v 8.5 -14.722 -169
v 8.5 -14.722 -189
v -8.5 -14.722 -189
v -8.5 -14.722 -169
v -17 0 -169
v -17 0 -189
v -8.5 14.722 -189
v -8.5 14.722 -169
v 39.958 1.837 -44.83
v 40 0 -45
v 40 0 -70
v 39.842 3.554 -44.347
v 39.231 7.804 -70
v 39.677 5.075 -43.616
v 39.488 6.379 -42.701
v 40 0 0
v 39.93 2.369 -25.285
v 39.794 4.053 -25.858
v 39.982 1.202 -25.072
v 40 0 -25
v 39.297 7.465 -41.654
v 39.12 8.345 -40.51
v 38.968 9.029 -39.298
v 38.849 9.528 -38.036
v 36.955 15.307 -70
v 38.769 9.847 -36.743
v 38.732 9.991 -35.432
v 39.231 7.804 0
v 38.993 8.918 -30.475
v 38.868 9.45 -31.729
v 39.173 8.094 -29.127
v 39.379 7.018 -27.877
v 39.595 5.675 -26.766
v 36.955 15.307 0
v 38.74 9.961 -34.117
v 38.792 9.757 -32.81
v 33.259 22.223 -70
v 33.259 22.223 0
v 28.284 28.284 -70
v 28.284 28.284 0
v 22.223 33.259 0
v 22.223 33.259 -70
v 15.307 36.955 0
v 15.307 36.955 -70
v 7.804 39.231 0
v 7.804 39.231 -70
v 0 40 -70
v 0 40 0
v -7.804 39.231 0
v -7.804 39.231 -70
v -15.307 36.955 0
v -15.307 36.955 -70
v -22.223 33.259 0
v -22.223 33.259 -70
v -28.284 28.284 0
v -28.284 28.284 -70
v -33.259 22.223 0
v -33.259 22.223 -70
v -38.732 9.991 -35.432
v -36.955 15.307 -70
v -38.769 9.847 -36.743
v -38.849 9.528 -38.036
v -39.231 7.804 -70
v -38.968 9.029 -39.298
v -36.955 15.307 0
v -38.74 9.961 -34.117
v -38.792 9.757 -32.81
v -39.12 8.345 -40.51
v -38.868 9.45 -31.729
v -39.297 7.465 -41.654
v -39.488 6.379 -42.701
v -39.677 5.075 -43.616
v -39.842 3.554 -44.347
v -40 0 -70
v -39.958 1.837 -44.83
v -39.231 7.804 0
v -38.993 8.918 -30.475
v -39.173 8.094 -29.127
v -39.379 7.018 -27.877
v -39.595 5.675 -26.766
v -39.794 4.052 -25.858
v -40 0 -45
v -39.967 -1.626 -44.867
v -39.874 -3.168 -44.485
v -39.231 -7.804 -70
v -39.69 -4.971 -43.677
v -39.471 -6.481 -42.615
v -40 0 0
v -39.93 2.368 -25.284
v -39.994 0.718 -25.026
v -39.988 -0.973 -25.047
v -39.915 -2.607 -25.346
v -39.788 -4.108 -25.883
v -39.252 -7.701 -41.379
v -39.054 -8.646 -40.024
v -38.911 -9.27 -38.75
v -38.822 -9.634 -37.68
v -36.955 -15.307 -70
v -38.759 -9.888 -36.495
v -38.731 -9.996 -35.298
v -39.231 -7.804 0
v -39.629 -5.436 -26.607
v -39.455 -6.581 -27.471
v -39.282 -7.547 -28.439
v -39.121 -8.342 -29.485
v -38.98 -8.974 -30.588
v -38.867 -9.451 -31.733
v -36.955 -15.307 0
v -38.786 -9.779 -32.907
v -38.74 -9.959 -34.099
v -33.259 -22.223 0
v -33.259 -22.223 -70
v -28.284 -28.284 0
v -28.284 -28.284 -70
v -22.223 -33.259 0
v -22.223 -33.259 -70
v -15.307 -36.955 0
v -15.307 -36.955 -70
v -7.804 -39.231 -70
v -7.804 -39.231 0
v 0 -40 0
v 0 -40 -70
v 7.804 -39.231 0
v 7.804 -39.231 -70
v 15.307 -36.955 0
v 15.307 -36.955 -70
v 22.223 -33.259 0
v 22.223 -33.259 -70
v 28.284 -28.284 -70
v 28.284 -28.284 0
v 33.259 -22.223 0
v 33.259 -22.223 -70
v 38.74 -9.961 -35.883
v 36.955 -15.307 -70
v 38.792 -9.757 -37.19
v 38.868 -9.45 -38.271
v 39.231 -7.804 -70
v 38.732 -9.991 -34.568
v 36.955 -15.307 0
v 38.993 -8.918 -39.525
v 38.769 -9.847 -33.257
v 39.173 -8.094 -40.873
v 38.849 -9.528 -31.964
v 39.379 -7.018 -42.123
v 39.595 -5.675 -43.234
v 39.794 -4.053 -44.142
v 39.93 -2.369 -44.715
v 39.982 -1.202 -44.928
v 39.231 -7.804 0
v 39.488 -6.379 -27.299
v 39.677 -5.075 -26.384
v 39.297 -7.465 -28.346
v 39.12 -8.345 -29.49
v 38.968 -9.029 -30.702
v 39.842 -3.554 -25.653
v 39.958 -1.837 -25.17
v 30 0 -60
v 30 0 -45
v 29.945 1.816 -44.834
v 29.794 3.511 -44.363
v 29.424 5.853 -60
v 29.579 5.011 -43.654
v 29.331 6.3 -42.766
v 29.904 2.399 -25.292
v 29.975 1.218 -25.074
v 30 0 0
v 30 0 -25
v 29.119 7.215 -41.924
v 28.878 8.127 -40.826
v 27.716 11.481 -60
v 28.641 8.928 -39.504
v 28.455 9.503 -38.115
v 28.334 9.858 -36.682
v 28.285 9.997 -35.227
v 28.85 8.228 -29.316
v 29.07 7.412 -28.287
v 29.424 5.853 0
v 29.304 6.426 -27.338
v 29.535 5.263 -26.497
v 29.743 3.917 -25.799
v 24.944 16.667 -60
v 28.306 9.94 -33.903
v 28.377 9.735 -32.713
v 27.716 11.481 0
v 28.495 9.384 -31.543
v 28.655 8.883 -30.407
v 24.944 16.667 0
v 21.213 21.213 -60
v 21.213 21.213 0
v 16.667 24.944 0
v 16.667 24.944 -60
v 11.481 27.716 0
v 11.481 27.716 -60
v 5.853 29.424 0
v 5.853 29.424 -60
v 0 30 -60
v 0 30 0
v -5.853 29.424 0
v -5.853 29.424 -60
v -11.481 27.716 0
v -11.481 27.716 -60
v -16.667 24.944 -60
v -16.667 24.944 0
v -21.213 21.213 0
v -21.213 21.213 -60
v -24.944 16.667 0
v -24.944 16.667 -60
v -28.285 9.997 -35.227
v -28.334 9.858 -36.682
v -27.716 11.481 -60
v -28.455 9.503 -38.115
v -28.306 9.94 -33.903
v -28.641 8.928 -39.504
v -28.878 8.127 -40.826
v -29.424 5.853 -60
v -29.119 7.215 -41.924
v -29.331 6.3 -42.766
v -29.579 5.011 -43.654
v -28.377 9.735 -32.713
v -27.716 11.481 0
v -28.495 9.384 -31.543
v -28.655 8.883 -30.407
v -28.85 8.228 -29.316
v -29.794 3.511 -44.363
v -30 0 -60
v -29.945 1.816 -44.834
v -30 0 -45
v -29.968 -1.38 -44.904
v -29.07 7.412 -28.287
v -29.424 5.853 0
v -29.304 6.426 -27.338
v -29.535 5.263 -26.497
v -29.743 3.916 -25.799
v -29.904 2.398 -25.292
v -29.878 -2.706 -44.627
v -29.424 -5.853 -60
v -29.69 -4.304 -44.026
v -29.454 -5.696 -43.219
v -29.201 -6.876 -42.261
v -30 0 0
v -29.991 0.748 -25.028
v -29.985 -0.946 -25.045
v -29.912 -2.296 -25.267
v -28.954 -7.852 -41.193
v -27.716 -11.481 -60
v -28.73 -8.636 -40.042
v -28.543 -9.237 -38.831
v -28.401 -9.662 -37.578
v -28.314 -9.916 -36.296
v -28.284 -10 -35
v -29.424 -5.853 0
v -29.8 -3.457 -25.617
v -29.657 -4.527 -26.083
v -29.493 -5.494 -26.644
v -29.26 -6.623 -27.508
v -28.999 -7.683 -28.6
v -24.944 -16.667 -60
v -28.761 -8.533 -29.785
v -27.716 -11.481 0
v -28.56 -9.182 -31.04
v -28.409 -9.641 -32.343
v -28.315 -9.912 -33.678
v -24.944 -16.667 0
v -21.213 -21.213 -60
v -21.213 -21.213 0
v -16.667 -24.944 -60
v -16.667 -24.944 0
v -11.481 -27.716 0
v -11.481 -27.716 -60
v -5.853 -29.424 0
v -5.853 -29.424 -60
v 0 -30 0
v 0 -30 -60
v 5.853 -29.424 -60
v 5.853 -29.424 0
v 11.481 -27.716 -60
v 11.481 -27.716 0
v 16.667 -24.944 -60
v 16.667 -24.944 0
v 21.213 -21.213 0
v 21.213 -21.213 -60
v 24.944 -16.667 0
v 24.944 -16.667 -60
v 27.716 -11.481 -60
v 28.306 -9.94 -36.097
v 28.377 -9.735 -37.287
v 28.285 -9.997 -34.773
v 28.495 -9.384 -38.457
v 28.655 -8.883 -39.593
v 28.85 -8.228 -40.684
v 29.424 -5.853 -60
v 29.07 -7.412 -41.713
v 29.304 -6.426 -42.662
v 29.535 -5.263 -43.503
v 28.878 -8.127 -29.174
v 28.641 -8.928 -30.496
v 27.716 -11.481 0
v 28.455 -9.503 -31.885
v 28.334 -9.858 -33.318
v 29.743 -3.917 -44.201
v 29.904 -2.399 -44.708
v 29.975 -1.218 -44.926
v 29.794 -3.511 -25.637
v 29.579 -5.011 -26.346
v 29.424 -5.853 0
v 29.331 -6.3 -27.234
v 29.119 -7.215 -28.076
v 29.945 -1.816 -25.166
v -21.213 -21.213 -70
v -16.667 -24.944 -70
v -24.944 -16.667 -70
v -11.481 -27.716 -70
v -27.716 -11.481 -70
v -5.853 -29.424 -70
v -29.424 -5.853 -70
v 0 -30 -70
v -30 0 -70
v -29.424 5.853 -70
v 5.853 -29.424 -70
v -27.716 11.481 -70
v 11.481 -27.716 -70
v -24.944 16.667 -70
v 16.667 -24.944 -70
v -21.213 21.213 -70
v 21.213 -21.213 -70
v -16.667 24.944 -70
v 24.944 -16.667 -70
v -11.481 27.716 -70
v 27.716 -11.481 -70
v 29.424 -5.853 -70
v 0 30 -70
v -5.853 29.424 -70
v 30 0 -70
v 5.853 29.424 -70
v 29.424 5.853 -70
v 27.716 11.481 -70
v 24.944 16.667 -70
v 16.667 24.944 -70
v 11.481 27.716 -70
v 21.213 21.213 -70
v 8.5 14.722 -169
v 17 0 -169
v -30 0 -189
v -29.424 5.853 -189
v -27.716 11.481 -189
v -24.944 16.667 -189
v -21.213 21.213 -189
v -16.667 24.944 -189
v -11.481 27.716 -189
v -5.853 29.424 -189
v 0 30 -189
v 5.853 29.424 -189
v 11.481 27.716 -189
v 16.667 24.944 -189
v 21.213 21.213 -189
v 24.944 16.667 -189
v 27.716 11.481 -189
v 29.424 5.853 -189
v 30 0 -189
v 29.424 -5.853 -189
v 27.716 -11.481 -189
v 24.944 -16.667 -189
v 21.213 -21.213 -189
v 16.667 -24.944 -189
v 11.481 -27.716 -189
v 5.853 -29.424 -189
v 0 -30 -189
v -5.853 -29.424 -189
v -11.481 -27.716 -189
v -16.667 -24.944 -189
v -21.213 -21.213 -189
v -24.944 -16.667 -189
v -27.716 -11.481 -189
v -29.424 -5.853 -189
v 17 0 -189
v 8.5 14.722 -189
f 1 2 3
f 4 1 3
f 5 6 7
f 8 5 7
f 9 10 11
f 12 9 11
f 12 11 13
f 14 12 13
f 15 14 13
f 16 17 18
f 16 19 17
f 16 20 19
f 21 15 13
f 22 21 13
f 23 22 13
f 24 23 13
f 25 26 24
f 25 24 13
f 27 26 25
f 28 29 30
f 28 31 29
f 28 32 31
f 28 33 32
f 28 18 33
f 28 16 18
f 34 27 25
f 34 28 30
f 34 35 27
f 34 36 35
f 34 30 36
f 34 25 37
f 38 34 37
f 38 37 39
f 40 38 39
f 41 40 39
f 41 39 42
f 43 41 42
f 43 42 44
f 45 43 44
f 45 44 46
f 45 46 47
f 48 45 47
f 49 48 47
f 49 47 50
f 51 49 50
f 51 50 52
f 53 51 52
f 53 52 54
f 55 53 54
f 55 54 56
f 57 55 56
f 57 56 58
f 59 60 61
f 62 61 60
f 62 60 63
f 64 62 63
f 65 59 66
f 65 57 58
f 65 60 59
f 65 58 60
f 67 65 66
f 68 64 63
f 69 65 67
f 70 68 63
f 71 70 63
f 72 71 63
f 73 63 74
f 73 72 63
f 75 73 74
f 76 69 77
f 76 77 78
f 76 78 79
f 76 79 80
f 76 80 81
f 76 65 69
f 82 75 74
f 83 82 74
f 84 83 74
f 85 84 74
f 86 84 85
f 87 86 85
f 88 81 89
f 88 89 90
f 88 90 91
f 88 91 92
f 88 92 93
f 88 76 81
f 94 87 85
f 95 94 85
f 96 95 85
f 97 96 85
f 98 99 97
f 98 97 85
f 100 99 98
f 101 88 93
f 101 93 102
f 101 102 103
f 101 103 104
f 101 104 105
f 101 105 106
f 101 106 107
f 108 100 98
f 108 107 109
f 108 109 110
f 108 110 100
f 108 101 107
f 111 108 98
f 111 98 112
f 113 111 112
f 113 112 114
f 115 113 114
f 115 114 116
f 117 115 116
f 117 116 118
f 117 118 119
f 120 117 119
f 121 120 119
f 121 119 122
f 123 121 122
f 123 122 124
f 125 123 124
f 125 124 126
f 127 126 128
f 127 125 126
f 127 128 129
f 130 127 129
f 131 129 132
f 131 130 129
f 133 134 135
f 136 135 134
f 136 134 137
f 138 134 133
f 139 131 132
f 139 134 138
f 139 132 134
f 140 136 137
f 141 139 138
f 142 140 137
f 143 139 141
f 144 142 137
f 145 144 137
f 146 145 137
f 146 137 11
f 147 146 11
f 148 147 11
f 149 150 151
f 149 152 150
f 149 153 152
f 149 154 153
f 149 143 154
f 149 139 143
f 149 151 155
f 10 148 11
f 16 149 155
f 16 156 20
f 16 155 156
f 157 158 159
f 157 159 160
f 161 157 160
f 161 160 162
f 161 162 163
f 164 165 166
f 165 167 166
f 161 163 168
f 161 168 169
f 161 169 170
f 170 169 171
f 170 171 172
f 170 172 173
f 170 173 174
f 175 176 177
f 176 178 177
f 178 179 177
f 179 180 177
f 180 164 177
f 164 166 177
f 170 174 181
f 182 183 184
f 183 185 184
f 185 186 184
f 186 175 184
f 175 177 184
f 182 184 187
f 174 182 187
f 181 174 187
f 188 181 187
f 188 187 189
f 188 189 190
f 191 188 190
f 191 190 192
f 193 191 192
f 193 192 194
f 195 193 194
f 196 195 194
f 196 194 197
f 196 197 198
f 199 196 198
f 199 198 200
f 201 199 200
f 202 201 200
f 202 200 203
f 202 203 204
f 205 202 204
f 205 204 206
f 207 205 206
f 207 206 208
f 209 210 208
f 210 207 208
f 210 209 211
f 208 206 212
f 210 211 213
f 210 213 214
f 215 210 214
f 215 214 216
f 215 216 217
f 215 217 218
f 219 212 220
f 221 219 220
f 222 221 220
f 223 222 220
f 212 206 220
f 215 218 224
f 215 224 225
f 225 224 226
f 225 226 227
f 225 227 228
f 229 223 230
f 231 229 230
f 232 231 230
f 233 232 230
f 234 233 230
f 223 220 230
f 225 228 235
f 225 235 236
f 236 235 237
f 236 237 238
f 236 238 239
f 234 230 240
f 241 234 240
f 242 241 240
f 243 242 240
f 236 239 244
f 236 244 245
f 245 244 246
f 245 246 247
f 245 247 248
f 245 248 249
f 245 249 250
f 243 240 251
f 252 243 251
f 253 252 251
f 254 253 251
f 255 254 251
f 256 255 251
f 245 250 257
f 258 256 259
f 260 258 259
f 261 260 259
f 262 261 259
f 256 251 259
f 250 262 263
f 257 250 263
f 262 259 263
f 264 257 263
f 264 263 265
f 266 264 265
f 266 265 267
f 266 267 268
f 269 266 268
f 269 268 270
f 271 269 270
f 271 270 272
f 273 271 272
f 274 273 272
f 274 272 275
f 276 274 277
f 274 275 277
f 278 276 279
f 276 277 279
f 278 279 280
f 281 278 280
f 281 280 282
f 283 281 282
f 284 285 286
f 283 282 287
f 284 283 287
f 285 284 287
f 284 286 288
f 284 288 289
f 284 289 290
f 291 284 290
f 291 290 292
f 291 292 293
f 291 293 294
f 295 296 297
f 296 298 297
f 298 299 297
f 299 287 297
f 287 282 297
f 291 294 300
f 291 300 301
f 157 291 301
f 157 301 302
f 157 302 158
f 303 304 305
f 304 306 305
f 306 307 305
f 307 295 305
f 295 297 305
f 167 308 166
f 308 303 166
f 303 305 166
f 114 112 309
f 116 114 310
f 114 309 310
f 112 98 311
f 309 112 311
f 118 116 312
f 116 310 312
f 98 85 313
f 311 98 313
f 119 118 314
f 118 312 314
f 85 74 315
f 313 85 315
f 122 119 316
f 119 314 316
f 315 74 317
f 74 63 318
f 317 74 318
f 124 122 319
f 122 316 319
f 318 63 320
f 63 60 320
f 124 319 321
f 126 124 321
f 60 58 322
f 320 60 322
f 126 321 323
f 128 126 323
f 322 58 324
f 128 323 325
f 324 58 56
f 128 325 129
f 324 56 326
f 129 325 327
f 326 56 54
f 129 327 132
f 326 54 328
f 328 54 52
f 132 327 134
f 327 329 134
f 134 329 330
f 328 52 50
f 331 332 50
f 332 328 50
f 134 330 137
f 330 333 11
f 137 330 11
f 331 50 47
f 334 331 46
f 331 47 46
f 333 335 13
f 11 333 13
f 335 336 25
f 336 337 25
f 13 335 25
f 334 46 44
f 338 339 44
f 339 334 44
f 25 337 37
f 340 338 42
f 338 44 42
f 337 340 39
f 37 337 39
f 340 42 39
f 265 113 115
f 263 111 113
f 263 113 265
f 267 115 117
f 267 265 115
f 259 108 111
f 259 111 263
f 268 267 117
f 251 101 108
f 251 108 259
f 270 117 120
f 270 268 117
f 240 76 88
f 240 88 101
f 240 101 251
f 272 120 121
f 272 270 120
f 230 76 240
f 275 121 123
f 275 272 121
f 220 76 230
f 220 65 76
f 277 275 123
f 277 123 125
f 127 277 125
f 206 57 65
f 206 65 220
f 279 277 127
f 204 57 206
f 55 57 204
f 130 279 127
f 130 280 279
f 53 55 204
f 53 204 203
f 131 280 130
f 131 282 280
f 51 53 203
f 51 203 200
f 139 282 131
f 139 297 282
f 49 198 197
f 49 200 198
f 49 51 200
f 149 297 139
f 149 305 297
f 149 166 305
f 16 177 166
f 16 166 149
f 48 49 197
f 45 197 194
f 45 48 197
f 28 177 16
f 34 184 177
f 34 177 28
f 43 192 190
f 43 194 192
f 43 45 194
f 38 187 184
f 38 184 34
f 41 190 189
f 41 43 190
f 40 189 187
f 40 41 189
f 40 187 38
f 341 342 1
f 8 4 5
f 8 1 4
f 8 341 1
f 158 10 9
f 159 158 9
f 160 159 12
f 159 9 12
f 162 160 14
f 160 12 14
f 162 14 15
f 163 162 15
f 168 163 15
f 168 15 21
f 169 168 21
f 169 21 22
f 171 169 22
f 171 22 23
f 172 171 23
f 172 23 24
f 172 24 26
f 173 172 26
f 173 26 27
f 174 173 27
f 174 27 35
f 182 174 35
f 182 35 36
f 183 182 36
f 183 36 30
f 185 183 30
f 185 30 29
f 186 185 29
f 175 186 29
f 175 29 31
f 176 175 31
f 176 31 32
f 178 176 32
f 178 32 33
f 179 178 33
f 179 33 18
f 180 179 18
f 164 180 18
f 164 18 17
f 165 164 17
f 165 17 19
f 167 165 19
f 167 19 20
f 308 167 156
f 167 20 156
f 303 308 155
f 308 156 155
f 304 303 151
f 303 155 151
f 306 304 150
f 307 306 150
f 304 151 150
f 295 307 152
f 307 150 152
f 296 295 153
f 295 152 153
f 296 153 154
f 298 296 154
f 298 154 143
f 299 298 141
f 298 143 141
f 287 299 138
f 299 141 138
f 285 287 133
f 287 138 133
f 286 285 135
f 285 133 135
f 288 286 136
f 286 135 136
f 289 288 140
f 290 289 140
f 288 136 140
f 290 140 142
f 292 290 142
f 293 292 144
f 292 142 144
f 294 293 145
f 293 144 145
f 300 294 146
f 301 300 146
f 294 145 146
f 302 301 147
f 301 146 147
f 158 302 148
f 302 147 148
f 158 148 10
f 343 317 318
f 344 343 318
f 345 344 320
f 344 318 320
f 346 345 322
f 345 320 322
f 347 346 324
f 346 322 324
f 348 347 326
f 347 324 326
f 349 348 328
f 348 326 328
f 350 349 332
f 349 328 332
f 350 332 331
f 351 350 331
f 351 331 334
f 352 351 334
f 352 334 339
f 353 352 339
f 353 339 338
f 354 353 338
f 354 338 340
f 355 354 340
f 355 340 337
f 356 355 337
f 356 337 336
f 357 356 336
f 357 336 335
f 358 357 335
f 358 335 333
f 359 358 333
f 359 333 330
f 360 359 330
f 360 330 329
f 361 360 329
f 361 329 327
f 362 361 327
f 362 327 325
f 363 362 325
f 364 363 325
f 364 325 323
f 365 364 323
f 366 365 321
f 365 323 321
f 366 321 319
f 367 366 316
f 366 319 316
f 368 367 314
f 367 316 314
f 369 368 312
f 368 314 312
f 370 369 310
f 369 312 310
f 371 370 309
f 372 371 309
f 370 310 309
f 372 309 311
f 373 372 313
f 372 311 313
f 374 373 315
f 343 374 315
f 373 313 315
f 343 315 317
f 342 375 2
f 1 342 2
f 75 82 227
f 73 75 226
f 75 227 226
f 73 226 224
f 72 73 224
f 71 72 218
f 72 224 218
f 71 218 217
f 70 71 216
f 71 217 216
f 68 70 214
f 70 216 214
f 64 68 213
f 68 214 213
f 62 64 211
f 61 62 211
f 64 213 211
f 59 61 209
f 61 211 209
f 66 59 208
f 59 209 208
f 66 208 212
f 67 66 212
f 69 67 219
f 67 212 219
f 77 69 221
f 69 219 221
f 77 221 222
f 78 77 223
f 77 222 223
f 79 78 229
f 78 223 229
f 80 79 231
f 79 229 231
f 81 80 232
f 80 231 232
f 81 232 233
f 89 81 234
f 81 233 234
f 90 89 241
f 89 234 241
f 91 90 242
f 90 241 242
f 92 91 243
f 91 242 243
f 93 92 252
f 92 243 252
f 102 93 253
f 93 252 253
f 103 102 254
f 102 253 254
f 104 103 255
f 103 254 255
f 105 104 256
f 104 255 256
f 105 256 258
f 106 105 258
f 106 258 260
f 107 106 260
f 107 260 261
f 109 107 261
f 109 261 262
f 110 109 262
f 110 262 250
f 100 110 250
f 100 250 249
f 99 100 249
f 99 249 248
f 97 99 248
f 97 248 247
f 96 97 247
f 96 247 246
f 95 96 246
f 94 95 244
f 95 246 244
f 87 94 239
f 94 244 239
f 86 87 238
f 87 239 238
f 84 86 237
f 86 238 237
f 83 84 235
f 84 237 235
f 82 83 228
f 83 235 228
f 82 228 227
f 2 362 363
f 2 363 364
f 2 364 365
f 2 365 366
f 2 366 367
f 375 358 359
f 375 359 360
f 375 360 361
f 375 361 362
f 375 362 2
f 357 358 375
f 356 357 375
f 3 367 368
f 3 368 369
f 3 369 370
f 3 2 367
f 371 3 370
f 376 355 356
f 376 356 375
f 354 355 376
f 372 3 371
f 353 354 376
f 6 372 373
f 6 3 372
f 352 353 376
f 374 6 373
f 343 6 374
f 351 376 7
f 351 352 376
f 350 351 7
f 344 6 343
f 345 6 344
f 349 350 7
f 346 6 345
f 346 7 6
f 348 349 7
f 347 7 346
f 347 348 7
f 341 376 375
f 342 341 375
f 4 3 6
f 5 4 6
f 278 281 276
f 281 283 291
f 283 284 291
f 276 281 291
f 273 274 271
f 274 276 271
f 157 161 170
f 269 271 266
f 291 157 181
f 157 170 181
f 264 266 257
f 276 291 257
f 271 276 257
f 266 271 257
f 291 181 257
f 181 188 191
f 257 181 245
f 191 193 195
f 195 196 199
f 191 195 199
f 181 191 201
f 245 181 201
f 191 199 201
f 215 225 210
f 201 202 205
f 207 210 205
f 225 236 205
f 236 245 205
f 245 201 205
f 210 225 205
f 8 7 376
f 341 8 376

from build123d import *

# Parameters (mm, degrees)
SKETCH1_R                = 40
SKETCH1_R_2              = 30
BOSS_EXTRUDE1_DEPTH      = 70
SKETCH2_R                = 30
BOSS_EXTRUDE2_DEPTH      = 119
BOSS_EXTRUDE2_DEPTH_BACK = 10
CUT_EXTRUDE1_DEPTH       = 20
SKETCH5_R                = 10
CUT_EXTRUDE2_DEPTH       = 55


with BuildPart() as part:
    # Sketch1 → Boss-Extrude1 (new body)
    with BuildSketch(Plane.XY):
        Circle(SKETCH1_R)
        Circle(SKETCH1_R_2, mode=Mode.SUBTRACT)
    extrude(amount=-BOSS_EXTRUDE1_DEPTH)

    # Sketch2 → Boss-Extrude2 (add, two sides)
    with BuildSketch(Plane(origin=(0, 0, -70), x_dir=(-1, 0, 0), z_dir=(0, 0, -1))) as boss_extrude2_sk:
        Circle(SKETCH2_R)
    extrude(amount=BOSS_EXTRUDE2_DEPTH)
    extrude(boss_extrude2_sk.sketch, amount=-BOSS_EXTRUDE2_DEPTH_BACK)

    # Sketch4 → Cut-Extrude1 (cut)
    with BuildSketch(Plane(origin=(0, 0, -189), x_dir=(-1, 0, 0), z_dir=(0, 0, -1))):
        Polygon((8.5, -14.722431864), (17, 0), (8.5, 14.722431864), (-8.5, 14.722431864), (-17, 0), (-8.5, -14.722431864), align=None)
    extrude(amount=-CUT_EXTRUDE1_DEPTH, mode=Mode.SUBTRACT)

    # Sketch5 → Cut-Extrude2 (cut, symmetric)
    with BuildSketch(Plane(origin=(0, 0, 0), x_dir=(0, 0, -1), z_dir=(1, 0, 0))):
        with Locations((35, 0)):
            Circle(SKETCH5_R)
    extrude(amount=CUT_EXTRUDE2_DEPTH, both=True, mode=Mode.SUBTRACT)


solid = part.part
